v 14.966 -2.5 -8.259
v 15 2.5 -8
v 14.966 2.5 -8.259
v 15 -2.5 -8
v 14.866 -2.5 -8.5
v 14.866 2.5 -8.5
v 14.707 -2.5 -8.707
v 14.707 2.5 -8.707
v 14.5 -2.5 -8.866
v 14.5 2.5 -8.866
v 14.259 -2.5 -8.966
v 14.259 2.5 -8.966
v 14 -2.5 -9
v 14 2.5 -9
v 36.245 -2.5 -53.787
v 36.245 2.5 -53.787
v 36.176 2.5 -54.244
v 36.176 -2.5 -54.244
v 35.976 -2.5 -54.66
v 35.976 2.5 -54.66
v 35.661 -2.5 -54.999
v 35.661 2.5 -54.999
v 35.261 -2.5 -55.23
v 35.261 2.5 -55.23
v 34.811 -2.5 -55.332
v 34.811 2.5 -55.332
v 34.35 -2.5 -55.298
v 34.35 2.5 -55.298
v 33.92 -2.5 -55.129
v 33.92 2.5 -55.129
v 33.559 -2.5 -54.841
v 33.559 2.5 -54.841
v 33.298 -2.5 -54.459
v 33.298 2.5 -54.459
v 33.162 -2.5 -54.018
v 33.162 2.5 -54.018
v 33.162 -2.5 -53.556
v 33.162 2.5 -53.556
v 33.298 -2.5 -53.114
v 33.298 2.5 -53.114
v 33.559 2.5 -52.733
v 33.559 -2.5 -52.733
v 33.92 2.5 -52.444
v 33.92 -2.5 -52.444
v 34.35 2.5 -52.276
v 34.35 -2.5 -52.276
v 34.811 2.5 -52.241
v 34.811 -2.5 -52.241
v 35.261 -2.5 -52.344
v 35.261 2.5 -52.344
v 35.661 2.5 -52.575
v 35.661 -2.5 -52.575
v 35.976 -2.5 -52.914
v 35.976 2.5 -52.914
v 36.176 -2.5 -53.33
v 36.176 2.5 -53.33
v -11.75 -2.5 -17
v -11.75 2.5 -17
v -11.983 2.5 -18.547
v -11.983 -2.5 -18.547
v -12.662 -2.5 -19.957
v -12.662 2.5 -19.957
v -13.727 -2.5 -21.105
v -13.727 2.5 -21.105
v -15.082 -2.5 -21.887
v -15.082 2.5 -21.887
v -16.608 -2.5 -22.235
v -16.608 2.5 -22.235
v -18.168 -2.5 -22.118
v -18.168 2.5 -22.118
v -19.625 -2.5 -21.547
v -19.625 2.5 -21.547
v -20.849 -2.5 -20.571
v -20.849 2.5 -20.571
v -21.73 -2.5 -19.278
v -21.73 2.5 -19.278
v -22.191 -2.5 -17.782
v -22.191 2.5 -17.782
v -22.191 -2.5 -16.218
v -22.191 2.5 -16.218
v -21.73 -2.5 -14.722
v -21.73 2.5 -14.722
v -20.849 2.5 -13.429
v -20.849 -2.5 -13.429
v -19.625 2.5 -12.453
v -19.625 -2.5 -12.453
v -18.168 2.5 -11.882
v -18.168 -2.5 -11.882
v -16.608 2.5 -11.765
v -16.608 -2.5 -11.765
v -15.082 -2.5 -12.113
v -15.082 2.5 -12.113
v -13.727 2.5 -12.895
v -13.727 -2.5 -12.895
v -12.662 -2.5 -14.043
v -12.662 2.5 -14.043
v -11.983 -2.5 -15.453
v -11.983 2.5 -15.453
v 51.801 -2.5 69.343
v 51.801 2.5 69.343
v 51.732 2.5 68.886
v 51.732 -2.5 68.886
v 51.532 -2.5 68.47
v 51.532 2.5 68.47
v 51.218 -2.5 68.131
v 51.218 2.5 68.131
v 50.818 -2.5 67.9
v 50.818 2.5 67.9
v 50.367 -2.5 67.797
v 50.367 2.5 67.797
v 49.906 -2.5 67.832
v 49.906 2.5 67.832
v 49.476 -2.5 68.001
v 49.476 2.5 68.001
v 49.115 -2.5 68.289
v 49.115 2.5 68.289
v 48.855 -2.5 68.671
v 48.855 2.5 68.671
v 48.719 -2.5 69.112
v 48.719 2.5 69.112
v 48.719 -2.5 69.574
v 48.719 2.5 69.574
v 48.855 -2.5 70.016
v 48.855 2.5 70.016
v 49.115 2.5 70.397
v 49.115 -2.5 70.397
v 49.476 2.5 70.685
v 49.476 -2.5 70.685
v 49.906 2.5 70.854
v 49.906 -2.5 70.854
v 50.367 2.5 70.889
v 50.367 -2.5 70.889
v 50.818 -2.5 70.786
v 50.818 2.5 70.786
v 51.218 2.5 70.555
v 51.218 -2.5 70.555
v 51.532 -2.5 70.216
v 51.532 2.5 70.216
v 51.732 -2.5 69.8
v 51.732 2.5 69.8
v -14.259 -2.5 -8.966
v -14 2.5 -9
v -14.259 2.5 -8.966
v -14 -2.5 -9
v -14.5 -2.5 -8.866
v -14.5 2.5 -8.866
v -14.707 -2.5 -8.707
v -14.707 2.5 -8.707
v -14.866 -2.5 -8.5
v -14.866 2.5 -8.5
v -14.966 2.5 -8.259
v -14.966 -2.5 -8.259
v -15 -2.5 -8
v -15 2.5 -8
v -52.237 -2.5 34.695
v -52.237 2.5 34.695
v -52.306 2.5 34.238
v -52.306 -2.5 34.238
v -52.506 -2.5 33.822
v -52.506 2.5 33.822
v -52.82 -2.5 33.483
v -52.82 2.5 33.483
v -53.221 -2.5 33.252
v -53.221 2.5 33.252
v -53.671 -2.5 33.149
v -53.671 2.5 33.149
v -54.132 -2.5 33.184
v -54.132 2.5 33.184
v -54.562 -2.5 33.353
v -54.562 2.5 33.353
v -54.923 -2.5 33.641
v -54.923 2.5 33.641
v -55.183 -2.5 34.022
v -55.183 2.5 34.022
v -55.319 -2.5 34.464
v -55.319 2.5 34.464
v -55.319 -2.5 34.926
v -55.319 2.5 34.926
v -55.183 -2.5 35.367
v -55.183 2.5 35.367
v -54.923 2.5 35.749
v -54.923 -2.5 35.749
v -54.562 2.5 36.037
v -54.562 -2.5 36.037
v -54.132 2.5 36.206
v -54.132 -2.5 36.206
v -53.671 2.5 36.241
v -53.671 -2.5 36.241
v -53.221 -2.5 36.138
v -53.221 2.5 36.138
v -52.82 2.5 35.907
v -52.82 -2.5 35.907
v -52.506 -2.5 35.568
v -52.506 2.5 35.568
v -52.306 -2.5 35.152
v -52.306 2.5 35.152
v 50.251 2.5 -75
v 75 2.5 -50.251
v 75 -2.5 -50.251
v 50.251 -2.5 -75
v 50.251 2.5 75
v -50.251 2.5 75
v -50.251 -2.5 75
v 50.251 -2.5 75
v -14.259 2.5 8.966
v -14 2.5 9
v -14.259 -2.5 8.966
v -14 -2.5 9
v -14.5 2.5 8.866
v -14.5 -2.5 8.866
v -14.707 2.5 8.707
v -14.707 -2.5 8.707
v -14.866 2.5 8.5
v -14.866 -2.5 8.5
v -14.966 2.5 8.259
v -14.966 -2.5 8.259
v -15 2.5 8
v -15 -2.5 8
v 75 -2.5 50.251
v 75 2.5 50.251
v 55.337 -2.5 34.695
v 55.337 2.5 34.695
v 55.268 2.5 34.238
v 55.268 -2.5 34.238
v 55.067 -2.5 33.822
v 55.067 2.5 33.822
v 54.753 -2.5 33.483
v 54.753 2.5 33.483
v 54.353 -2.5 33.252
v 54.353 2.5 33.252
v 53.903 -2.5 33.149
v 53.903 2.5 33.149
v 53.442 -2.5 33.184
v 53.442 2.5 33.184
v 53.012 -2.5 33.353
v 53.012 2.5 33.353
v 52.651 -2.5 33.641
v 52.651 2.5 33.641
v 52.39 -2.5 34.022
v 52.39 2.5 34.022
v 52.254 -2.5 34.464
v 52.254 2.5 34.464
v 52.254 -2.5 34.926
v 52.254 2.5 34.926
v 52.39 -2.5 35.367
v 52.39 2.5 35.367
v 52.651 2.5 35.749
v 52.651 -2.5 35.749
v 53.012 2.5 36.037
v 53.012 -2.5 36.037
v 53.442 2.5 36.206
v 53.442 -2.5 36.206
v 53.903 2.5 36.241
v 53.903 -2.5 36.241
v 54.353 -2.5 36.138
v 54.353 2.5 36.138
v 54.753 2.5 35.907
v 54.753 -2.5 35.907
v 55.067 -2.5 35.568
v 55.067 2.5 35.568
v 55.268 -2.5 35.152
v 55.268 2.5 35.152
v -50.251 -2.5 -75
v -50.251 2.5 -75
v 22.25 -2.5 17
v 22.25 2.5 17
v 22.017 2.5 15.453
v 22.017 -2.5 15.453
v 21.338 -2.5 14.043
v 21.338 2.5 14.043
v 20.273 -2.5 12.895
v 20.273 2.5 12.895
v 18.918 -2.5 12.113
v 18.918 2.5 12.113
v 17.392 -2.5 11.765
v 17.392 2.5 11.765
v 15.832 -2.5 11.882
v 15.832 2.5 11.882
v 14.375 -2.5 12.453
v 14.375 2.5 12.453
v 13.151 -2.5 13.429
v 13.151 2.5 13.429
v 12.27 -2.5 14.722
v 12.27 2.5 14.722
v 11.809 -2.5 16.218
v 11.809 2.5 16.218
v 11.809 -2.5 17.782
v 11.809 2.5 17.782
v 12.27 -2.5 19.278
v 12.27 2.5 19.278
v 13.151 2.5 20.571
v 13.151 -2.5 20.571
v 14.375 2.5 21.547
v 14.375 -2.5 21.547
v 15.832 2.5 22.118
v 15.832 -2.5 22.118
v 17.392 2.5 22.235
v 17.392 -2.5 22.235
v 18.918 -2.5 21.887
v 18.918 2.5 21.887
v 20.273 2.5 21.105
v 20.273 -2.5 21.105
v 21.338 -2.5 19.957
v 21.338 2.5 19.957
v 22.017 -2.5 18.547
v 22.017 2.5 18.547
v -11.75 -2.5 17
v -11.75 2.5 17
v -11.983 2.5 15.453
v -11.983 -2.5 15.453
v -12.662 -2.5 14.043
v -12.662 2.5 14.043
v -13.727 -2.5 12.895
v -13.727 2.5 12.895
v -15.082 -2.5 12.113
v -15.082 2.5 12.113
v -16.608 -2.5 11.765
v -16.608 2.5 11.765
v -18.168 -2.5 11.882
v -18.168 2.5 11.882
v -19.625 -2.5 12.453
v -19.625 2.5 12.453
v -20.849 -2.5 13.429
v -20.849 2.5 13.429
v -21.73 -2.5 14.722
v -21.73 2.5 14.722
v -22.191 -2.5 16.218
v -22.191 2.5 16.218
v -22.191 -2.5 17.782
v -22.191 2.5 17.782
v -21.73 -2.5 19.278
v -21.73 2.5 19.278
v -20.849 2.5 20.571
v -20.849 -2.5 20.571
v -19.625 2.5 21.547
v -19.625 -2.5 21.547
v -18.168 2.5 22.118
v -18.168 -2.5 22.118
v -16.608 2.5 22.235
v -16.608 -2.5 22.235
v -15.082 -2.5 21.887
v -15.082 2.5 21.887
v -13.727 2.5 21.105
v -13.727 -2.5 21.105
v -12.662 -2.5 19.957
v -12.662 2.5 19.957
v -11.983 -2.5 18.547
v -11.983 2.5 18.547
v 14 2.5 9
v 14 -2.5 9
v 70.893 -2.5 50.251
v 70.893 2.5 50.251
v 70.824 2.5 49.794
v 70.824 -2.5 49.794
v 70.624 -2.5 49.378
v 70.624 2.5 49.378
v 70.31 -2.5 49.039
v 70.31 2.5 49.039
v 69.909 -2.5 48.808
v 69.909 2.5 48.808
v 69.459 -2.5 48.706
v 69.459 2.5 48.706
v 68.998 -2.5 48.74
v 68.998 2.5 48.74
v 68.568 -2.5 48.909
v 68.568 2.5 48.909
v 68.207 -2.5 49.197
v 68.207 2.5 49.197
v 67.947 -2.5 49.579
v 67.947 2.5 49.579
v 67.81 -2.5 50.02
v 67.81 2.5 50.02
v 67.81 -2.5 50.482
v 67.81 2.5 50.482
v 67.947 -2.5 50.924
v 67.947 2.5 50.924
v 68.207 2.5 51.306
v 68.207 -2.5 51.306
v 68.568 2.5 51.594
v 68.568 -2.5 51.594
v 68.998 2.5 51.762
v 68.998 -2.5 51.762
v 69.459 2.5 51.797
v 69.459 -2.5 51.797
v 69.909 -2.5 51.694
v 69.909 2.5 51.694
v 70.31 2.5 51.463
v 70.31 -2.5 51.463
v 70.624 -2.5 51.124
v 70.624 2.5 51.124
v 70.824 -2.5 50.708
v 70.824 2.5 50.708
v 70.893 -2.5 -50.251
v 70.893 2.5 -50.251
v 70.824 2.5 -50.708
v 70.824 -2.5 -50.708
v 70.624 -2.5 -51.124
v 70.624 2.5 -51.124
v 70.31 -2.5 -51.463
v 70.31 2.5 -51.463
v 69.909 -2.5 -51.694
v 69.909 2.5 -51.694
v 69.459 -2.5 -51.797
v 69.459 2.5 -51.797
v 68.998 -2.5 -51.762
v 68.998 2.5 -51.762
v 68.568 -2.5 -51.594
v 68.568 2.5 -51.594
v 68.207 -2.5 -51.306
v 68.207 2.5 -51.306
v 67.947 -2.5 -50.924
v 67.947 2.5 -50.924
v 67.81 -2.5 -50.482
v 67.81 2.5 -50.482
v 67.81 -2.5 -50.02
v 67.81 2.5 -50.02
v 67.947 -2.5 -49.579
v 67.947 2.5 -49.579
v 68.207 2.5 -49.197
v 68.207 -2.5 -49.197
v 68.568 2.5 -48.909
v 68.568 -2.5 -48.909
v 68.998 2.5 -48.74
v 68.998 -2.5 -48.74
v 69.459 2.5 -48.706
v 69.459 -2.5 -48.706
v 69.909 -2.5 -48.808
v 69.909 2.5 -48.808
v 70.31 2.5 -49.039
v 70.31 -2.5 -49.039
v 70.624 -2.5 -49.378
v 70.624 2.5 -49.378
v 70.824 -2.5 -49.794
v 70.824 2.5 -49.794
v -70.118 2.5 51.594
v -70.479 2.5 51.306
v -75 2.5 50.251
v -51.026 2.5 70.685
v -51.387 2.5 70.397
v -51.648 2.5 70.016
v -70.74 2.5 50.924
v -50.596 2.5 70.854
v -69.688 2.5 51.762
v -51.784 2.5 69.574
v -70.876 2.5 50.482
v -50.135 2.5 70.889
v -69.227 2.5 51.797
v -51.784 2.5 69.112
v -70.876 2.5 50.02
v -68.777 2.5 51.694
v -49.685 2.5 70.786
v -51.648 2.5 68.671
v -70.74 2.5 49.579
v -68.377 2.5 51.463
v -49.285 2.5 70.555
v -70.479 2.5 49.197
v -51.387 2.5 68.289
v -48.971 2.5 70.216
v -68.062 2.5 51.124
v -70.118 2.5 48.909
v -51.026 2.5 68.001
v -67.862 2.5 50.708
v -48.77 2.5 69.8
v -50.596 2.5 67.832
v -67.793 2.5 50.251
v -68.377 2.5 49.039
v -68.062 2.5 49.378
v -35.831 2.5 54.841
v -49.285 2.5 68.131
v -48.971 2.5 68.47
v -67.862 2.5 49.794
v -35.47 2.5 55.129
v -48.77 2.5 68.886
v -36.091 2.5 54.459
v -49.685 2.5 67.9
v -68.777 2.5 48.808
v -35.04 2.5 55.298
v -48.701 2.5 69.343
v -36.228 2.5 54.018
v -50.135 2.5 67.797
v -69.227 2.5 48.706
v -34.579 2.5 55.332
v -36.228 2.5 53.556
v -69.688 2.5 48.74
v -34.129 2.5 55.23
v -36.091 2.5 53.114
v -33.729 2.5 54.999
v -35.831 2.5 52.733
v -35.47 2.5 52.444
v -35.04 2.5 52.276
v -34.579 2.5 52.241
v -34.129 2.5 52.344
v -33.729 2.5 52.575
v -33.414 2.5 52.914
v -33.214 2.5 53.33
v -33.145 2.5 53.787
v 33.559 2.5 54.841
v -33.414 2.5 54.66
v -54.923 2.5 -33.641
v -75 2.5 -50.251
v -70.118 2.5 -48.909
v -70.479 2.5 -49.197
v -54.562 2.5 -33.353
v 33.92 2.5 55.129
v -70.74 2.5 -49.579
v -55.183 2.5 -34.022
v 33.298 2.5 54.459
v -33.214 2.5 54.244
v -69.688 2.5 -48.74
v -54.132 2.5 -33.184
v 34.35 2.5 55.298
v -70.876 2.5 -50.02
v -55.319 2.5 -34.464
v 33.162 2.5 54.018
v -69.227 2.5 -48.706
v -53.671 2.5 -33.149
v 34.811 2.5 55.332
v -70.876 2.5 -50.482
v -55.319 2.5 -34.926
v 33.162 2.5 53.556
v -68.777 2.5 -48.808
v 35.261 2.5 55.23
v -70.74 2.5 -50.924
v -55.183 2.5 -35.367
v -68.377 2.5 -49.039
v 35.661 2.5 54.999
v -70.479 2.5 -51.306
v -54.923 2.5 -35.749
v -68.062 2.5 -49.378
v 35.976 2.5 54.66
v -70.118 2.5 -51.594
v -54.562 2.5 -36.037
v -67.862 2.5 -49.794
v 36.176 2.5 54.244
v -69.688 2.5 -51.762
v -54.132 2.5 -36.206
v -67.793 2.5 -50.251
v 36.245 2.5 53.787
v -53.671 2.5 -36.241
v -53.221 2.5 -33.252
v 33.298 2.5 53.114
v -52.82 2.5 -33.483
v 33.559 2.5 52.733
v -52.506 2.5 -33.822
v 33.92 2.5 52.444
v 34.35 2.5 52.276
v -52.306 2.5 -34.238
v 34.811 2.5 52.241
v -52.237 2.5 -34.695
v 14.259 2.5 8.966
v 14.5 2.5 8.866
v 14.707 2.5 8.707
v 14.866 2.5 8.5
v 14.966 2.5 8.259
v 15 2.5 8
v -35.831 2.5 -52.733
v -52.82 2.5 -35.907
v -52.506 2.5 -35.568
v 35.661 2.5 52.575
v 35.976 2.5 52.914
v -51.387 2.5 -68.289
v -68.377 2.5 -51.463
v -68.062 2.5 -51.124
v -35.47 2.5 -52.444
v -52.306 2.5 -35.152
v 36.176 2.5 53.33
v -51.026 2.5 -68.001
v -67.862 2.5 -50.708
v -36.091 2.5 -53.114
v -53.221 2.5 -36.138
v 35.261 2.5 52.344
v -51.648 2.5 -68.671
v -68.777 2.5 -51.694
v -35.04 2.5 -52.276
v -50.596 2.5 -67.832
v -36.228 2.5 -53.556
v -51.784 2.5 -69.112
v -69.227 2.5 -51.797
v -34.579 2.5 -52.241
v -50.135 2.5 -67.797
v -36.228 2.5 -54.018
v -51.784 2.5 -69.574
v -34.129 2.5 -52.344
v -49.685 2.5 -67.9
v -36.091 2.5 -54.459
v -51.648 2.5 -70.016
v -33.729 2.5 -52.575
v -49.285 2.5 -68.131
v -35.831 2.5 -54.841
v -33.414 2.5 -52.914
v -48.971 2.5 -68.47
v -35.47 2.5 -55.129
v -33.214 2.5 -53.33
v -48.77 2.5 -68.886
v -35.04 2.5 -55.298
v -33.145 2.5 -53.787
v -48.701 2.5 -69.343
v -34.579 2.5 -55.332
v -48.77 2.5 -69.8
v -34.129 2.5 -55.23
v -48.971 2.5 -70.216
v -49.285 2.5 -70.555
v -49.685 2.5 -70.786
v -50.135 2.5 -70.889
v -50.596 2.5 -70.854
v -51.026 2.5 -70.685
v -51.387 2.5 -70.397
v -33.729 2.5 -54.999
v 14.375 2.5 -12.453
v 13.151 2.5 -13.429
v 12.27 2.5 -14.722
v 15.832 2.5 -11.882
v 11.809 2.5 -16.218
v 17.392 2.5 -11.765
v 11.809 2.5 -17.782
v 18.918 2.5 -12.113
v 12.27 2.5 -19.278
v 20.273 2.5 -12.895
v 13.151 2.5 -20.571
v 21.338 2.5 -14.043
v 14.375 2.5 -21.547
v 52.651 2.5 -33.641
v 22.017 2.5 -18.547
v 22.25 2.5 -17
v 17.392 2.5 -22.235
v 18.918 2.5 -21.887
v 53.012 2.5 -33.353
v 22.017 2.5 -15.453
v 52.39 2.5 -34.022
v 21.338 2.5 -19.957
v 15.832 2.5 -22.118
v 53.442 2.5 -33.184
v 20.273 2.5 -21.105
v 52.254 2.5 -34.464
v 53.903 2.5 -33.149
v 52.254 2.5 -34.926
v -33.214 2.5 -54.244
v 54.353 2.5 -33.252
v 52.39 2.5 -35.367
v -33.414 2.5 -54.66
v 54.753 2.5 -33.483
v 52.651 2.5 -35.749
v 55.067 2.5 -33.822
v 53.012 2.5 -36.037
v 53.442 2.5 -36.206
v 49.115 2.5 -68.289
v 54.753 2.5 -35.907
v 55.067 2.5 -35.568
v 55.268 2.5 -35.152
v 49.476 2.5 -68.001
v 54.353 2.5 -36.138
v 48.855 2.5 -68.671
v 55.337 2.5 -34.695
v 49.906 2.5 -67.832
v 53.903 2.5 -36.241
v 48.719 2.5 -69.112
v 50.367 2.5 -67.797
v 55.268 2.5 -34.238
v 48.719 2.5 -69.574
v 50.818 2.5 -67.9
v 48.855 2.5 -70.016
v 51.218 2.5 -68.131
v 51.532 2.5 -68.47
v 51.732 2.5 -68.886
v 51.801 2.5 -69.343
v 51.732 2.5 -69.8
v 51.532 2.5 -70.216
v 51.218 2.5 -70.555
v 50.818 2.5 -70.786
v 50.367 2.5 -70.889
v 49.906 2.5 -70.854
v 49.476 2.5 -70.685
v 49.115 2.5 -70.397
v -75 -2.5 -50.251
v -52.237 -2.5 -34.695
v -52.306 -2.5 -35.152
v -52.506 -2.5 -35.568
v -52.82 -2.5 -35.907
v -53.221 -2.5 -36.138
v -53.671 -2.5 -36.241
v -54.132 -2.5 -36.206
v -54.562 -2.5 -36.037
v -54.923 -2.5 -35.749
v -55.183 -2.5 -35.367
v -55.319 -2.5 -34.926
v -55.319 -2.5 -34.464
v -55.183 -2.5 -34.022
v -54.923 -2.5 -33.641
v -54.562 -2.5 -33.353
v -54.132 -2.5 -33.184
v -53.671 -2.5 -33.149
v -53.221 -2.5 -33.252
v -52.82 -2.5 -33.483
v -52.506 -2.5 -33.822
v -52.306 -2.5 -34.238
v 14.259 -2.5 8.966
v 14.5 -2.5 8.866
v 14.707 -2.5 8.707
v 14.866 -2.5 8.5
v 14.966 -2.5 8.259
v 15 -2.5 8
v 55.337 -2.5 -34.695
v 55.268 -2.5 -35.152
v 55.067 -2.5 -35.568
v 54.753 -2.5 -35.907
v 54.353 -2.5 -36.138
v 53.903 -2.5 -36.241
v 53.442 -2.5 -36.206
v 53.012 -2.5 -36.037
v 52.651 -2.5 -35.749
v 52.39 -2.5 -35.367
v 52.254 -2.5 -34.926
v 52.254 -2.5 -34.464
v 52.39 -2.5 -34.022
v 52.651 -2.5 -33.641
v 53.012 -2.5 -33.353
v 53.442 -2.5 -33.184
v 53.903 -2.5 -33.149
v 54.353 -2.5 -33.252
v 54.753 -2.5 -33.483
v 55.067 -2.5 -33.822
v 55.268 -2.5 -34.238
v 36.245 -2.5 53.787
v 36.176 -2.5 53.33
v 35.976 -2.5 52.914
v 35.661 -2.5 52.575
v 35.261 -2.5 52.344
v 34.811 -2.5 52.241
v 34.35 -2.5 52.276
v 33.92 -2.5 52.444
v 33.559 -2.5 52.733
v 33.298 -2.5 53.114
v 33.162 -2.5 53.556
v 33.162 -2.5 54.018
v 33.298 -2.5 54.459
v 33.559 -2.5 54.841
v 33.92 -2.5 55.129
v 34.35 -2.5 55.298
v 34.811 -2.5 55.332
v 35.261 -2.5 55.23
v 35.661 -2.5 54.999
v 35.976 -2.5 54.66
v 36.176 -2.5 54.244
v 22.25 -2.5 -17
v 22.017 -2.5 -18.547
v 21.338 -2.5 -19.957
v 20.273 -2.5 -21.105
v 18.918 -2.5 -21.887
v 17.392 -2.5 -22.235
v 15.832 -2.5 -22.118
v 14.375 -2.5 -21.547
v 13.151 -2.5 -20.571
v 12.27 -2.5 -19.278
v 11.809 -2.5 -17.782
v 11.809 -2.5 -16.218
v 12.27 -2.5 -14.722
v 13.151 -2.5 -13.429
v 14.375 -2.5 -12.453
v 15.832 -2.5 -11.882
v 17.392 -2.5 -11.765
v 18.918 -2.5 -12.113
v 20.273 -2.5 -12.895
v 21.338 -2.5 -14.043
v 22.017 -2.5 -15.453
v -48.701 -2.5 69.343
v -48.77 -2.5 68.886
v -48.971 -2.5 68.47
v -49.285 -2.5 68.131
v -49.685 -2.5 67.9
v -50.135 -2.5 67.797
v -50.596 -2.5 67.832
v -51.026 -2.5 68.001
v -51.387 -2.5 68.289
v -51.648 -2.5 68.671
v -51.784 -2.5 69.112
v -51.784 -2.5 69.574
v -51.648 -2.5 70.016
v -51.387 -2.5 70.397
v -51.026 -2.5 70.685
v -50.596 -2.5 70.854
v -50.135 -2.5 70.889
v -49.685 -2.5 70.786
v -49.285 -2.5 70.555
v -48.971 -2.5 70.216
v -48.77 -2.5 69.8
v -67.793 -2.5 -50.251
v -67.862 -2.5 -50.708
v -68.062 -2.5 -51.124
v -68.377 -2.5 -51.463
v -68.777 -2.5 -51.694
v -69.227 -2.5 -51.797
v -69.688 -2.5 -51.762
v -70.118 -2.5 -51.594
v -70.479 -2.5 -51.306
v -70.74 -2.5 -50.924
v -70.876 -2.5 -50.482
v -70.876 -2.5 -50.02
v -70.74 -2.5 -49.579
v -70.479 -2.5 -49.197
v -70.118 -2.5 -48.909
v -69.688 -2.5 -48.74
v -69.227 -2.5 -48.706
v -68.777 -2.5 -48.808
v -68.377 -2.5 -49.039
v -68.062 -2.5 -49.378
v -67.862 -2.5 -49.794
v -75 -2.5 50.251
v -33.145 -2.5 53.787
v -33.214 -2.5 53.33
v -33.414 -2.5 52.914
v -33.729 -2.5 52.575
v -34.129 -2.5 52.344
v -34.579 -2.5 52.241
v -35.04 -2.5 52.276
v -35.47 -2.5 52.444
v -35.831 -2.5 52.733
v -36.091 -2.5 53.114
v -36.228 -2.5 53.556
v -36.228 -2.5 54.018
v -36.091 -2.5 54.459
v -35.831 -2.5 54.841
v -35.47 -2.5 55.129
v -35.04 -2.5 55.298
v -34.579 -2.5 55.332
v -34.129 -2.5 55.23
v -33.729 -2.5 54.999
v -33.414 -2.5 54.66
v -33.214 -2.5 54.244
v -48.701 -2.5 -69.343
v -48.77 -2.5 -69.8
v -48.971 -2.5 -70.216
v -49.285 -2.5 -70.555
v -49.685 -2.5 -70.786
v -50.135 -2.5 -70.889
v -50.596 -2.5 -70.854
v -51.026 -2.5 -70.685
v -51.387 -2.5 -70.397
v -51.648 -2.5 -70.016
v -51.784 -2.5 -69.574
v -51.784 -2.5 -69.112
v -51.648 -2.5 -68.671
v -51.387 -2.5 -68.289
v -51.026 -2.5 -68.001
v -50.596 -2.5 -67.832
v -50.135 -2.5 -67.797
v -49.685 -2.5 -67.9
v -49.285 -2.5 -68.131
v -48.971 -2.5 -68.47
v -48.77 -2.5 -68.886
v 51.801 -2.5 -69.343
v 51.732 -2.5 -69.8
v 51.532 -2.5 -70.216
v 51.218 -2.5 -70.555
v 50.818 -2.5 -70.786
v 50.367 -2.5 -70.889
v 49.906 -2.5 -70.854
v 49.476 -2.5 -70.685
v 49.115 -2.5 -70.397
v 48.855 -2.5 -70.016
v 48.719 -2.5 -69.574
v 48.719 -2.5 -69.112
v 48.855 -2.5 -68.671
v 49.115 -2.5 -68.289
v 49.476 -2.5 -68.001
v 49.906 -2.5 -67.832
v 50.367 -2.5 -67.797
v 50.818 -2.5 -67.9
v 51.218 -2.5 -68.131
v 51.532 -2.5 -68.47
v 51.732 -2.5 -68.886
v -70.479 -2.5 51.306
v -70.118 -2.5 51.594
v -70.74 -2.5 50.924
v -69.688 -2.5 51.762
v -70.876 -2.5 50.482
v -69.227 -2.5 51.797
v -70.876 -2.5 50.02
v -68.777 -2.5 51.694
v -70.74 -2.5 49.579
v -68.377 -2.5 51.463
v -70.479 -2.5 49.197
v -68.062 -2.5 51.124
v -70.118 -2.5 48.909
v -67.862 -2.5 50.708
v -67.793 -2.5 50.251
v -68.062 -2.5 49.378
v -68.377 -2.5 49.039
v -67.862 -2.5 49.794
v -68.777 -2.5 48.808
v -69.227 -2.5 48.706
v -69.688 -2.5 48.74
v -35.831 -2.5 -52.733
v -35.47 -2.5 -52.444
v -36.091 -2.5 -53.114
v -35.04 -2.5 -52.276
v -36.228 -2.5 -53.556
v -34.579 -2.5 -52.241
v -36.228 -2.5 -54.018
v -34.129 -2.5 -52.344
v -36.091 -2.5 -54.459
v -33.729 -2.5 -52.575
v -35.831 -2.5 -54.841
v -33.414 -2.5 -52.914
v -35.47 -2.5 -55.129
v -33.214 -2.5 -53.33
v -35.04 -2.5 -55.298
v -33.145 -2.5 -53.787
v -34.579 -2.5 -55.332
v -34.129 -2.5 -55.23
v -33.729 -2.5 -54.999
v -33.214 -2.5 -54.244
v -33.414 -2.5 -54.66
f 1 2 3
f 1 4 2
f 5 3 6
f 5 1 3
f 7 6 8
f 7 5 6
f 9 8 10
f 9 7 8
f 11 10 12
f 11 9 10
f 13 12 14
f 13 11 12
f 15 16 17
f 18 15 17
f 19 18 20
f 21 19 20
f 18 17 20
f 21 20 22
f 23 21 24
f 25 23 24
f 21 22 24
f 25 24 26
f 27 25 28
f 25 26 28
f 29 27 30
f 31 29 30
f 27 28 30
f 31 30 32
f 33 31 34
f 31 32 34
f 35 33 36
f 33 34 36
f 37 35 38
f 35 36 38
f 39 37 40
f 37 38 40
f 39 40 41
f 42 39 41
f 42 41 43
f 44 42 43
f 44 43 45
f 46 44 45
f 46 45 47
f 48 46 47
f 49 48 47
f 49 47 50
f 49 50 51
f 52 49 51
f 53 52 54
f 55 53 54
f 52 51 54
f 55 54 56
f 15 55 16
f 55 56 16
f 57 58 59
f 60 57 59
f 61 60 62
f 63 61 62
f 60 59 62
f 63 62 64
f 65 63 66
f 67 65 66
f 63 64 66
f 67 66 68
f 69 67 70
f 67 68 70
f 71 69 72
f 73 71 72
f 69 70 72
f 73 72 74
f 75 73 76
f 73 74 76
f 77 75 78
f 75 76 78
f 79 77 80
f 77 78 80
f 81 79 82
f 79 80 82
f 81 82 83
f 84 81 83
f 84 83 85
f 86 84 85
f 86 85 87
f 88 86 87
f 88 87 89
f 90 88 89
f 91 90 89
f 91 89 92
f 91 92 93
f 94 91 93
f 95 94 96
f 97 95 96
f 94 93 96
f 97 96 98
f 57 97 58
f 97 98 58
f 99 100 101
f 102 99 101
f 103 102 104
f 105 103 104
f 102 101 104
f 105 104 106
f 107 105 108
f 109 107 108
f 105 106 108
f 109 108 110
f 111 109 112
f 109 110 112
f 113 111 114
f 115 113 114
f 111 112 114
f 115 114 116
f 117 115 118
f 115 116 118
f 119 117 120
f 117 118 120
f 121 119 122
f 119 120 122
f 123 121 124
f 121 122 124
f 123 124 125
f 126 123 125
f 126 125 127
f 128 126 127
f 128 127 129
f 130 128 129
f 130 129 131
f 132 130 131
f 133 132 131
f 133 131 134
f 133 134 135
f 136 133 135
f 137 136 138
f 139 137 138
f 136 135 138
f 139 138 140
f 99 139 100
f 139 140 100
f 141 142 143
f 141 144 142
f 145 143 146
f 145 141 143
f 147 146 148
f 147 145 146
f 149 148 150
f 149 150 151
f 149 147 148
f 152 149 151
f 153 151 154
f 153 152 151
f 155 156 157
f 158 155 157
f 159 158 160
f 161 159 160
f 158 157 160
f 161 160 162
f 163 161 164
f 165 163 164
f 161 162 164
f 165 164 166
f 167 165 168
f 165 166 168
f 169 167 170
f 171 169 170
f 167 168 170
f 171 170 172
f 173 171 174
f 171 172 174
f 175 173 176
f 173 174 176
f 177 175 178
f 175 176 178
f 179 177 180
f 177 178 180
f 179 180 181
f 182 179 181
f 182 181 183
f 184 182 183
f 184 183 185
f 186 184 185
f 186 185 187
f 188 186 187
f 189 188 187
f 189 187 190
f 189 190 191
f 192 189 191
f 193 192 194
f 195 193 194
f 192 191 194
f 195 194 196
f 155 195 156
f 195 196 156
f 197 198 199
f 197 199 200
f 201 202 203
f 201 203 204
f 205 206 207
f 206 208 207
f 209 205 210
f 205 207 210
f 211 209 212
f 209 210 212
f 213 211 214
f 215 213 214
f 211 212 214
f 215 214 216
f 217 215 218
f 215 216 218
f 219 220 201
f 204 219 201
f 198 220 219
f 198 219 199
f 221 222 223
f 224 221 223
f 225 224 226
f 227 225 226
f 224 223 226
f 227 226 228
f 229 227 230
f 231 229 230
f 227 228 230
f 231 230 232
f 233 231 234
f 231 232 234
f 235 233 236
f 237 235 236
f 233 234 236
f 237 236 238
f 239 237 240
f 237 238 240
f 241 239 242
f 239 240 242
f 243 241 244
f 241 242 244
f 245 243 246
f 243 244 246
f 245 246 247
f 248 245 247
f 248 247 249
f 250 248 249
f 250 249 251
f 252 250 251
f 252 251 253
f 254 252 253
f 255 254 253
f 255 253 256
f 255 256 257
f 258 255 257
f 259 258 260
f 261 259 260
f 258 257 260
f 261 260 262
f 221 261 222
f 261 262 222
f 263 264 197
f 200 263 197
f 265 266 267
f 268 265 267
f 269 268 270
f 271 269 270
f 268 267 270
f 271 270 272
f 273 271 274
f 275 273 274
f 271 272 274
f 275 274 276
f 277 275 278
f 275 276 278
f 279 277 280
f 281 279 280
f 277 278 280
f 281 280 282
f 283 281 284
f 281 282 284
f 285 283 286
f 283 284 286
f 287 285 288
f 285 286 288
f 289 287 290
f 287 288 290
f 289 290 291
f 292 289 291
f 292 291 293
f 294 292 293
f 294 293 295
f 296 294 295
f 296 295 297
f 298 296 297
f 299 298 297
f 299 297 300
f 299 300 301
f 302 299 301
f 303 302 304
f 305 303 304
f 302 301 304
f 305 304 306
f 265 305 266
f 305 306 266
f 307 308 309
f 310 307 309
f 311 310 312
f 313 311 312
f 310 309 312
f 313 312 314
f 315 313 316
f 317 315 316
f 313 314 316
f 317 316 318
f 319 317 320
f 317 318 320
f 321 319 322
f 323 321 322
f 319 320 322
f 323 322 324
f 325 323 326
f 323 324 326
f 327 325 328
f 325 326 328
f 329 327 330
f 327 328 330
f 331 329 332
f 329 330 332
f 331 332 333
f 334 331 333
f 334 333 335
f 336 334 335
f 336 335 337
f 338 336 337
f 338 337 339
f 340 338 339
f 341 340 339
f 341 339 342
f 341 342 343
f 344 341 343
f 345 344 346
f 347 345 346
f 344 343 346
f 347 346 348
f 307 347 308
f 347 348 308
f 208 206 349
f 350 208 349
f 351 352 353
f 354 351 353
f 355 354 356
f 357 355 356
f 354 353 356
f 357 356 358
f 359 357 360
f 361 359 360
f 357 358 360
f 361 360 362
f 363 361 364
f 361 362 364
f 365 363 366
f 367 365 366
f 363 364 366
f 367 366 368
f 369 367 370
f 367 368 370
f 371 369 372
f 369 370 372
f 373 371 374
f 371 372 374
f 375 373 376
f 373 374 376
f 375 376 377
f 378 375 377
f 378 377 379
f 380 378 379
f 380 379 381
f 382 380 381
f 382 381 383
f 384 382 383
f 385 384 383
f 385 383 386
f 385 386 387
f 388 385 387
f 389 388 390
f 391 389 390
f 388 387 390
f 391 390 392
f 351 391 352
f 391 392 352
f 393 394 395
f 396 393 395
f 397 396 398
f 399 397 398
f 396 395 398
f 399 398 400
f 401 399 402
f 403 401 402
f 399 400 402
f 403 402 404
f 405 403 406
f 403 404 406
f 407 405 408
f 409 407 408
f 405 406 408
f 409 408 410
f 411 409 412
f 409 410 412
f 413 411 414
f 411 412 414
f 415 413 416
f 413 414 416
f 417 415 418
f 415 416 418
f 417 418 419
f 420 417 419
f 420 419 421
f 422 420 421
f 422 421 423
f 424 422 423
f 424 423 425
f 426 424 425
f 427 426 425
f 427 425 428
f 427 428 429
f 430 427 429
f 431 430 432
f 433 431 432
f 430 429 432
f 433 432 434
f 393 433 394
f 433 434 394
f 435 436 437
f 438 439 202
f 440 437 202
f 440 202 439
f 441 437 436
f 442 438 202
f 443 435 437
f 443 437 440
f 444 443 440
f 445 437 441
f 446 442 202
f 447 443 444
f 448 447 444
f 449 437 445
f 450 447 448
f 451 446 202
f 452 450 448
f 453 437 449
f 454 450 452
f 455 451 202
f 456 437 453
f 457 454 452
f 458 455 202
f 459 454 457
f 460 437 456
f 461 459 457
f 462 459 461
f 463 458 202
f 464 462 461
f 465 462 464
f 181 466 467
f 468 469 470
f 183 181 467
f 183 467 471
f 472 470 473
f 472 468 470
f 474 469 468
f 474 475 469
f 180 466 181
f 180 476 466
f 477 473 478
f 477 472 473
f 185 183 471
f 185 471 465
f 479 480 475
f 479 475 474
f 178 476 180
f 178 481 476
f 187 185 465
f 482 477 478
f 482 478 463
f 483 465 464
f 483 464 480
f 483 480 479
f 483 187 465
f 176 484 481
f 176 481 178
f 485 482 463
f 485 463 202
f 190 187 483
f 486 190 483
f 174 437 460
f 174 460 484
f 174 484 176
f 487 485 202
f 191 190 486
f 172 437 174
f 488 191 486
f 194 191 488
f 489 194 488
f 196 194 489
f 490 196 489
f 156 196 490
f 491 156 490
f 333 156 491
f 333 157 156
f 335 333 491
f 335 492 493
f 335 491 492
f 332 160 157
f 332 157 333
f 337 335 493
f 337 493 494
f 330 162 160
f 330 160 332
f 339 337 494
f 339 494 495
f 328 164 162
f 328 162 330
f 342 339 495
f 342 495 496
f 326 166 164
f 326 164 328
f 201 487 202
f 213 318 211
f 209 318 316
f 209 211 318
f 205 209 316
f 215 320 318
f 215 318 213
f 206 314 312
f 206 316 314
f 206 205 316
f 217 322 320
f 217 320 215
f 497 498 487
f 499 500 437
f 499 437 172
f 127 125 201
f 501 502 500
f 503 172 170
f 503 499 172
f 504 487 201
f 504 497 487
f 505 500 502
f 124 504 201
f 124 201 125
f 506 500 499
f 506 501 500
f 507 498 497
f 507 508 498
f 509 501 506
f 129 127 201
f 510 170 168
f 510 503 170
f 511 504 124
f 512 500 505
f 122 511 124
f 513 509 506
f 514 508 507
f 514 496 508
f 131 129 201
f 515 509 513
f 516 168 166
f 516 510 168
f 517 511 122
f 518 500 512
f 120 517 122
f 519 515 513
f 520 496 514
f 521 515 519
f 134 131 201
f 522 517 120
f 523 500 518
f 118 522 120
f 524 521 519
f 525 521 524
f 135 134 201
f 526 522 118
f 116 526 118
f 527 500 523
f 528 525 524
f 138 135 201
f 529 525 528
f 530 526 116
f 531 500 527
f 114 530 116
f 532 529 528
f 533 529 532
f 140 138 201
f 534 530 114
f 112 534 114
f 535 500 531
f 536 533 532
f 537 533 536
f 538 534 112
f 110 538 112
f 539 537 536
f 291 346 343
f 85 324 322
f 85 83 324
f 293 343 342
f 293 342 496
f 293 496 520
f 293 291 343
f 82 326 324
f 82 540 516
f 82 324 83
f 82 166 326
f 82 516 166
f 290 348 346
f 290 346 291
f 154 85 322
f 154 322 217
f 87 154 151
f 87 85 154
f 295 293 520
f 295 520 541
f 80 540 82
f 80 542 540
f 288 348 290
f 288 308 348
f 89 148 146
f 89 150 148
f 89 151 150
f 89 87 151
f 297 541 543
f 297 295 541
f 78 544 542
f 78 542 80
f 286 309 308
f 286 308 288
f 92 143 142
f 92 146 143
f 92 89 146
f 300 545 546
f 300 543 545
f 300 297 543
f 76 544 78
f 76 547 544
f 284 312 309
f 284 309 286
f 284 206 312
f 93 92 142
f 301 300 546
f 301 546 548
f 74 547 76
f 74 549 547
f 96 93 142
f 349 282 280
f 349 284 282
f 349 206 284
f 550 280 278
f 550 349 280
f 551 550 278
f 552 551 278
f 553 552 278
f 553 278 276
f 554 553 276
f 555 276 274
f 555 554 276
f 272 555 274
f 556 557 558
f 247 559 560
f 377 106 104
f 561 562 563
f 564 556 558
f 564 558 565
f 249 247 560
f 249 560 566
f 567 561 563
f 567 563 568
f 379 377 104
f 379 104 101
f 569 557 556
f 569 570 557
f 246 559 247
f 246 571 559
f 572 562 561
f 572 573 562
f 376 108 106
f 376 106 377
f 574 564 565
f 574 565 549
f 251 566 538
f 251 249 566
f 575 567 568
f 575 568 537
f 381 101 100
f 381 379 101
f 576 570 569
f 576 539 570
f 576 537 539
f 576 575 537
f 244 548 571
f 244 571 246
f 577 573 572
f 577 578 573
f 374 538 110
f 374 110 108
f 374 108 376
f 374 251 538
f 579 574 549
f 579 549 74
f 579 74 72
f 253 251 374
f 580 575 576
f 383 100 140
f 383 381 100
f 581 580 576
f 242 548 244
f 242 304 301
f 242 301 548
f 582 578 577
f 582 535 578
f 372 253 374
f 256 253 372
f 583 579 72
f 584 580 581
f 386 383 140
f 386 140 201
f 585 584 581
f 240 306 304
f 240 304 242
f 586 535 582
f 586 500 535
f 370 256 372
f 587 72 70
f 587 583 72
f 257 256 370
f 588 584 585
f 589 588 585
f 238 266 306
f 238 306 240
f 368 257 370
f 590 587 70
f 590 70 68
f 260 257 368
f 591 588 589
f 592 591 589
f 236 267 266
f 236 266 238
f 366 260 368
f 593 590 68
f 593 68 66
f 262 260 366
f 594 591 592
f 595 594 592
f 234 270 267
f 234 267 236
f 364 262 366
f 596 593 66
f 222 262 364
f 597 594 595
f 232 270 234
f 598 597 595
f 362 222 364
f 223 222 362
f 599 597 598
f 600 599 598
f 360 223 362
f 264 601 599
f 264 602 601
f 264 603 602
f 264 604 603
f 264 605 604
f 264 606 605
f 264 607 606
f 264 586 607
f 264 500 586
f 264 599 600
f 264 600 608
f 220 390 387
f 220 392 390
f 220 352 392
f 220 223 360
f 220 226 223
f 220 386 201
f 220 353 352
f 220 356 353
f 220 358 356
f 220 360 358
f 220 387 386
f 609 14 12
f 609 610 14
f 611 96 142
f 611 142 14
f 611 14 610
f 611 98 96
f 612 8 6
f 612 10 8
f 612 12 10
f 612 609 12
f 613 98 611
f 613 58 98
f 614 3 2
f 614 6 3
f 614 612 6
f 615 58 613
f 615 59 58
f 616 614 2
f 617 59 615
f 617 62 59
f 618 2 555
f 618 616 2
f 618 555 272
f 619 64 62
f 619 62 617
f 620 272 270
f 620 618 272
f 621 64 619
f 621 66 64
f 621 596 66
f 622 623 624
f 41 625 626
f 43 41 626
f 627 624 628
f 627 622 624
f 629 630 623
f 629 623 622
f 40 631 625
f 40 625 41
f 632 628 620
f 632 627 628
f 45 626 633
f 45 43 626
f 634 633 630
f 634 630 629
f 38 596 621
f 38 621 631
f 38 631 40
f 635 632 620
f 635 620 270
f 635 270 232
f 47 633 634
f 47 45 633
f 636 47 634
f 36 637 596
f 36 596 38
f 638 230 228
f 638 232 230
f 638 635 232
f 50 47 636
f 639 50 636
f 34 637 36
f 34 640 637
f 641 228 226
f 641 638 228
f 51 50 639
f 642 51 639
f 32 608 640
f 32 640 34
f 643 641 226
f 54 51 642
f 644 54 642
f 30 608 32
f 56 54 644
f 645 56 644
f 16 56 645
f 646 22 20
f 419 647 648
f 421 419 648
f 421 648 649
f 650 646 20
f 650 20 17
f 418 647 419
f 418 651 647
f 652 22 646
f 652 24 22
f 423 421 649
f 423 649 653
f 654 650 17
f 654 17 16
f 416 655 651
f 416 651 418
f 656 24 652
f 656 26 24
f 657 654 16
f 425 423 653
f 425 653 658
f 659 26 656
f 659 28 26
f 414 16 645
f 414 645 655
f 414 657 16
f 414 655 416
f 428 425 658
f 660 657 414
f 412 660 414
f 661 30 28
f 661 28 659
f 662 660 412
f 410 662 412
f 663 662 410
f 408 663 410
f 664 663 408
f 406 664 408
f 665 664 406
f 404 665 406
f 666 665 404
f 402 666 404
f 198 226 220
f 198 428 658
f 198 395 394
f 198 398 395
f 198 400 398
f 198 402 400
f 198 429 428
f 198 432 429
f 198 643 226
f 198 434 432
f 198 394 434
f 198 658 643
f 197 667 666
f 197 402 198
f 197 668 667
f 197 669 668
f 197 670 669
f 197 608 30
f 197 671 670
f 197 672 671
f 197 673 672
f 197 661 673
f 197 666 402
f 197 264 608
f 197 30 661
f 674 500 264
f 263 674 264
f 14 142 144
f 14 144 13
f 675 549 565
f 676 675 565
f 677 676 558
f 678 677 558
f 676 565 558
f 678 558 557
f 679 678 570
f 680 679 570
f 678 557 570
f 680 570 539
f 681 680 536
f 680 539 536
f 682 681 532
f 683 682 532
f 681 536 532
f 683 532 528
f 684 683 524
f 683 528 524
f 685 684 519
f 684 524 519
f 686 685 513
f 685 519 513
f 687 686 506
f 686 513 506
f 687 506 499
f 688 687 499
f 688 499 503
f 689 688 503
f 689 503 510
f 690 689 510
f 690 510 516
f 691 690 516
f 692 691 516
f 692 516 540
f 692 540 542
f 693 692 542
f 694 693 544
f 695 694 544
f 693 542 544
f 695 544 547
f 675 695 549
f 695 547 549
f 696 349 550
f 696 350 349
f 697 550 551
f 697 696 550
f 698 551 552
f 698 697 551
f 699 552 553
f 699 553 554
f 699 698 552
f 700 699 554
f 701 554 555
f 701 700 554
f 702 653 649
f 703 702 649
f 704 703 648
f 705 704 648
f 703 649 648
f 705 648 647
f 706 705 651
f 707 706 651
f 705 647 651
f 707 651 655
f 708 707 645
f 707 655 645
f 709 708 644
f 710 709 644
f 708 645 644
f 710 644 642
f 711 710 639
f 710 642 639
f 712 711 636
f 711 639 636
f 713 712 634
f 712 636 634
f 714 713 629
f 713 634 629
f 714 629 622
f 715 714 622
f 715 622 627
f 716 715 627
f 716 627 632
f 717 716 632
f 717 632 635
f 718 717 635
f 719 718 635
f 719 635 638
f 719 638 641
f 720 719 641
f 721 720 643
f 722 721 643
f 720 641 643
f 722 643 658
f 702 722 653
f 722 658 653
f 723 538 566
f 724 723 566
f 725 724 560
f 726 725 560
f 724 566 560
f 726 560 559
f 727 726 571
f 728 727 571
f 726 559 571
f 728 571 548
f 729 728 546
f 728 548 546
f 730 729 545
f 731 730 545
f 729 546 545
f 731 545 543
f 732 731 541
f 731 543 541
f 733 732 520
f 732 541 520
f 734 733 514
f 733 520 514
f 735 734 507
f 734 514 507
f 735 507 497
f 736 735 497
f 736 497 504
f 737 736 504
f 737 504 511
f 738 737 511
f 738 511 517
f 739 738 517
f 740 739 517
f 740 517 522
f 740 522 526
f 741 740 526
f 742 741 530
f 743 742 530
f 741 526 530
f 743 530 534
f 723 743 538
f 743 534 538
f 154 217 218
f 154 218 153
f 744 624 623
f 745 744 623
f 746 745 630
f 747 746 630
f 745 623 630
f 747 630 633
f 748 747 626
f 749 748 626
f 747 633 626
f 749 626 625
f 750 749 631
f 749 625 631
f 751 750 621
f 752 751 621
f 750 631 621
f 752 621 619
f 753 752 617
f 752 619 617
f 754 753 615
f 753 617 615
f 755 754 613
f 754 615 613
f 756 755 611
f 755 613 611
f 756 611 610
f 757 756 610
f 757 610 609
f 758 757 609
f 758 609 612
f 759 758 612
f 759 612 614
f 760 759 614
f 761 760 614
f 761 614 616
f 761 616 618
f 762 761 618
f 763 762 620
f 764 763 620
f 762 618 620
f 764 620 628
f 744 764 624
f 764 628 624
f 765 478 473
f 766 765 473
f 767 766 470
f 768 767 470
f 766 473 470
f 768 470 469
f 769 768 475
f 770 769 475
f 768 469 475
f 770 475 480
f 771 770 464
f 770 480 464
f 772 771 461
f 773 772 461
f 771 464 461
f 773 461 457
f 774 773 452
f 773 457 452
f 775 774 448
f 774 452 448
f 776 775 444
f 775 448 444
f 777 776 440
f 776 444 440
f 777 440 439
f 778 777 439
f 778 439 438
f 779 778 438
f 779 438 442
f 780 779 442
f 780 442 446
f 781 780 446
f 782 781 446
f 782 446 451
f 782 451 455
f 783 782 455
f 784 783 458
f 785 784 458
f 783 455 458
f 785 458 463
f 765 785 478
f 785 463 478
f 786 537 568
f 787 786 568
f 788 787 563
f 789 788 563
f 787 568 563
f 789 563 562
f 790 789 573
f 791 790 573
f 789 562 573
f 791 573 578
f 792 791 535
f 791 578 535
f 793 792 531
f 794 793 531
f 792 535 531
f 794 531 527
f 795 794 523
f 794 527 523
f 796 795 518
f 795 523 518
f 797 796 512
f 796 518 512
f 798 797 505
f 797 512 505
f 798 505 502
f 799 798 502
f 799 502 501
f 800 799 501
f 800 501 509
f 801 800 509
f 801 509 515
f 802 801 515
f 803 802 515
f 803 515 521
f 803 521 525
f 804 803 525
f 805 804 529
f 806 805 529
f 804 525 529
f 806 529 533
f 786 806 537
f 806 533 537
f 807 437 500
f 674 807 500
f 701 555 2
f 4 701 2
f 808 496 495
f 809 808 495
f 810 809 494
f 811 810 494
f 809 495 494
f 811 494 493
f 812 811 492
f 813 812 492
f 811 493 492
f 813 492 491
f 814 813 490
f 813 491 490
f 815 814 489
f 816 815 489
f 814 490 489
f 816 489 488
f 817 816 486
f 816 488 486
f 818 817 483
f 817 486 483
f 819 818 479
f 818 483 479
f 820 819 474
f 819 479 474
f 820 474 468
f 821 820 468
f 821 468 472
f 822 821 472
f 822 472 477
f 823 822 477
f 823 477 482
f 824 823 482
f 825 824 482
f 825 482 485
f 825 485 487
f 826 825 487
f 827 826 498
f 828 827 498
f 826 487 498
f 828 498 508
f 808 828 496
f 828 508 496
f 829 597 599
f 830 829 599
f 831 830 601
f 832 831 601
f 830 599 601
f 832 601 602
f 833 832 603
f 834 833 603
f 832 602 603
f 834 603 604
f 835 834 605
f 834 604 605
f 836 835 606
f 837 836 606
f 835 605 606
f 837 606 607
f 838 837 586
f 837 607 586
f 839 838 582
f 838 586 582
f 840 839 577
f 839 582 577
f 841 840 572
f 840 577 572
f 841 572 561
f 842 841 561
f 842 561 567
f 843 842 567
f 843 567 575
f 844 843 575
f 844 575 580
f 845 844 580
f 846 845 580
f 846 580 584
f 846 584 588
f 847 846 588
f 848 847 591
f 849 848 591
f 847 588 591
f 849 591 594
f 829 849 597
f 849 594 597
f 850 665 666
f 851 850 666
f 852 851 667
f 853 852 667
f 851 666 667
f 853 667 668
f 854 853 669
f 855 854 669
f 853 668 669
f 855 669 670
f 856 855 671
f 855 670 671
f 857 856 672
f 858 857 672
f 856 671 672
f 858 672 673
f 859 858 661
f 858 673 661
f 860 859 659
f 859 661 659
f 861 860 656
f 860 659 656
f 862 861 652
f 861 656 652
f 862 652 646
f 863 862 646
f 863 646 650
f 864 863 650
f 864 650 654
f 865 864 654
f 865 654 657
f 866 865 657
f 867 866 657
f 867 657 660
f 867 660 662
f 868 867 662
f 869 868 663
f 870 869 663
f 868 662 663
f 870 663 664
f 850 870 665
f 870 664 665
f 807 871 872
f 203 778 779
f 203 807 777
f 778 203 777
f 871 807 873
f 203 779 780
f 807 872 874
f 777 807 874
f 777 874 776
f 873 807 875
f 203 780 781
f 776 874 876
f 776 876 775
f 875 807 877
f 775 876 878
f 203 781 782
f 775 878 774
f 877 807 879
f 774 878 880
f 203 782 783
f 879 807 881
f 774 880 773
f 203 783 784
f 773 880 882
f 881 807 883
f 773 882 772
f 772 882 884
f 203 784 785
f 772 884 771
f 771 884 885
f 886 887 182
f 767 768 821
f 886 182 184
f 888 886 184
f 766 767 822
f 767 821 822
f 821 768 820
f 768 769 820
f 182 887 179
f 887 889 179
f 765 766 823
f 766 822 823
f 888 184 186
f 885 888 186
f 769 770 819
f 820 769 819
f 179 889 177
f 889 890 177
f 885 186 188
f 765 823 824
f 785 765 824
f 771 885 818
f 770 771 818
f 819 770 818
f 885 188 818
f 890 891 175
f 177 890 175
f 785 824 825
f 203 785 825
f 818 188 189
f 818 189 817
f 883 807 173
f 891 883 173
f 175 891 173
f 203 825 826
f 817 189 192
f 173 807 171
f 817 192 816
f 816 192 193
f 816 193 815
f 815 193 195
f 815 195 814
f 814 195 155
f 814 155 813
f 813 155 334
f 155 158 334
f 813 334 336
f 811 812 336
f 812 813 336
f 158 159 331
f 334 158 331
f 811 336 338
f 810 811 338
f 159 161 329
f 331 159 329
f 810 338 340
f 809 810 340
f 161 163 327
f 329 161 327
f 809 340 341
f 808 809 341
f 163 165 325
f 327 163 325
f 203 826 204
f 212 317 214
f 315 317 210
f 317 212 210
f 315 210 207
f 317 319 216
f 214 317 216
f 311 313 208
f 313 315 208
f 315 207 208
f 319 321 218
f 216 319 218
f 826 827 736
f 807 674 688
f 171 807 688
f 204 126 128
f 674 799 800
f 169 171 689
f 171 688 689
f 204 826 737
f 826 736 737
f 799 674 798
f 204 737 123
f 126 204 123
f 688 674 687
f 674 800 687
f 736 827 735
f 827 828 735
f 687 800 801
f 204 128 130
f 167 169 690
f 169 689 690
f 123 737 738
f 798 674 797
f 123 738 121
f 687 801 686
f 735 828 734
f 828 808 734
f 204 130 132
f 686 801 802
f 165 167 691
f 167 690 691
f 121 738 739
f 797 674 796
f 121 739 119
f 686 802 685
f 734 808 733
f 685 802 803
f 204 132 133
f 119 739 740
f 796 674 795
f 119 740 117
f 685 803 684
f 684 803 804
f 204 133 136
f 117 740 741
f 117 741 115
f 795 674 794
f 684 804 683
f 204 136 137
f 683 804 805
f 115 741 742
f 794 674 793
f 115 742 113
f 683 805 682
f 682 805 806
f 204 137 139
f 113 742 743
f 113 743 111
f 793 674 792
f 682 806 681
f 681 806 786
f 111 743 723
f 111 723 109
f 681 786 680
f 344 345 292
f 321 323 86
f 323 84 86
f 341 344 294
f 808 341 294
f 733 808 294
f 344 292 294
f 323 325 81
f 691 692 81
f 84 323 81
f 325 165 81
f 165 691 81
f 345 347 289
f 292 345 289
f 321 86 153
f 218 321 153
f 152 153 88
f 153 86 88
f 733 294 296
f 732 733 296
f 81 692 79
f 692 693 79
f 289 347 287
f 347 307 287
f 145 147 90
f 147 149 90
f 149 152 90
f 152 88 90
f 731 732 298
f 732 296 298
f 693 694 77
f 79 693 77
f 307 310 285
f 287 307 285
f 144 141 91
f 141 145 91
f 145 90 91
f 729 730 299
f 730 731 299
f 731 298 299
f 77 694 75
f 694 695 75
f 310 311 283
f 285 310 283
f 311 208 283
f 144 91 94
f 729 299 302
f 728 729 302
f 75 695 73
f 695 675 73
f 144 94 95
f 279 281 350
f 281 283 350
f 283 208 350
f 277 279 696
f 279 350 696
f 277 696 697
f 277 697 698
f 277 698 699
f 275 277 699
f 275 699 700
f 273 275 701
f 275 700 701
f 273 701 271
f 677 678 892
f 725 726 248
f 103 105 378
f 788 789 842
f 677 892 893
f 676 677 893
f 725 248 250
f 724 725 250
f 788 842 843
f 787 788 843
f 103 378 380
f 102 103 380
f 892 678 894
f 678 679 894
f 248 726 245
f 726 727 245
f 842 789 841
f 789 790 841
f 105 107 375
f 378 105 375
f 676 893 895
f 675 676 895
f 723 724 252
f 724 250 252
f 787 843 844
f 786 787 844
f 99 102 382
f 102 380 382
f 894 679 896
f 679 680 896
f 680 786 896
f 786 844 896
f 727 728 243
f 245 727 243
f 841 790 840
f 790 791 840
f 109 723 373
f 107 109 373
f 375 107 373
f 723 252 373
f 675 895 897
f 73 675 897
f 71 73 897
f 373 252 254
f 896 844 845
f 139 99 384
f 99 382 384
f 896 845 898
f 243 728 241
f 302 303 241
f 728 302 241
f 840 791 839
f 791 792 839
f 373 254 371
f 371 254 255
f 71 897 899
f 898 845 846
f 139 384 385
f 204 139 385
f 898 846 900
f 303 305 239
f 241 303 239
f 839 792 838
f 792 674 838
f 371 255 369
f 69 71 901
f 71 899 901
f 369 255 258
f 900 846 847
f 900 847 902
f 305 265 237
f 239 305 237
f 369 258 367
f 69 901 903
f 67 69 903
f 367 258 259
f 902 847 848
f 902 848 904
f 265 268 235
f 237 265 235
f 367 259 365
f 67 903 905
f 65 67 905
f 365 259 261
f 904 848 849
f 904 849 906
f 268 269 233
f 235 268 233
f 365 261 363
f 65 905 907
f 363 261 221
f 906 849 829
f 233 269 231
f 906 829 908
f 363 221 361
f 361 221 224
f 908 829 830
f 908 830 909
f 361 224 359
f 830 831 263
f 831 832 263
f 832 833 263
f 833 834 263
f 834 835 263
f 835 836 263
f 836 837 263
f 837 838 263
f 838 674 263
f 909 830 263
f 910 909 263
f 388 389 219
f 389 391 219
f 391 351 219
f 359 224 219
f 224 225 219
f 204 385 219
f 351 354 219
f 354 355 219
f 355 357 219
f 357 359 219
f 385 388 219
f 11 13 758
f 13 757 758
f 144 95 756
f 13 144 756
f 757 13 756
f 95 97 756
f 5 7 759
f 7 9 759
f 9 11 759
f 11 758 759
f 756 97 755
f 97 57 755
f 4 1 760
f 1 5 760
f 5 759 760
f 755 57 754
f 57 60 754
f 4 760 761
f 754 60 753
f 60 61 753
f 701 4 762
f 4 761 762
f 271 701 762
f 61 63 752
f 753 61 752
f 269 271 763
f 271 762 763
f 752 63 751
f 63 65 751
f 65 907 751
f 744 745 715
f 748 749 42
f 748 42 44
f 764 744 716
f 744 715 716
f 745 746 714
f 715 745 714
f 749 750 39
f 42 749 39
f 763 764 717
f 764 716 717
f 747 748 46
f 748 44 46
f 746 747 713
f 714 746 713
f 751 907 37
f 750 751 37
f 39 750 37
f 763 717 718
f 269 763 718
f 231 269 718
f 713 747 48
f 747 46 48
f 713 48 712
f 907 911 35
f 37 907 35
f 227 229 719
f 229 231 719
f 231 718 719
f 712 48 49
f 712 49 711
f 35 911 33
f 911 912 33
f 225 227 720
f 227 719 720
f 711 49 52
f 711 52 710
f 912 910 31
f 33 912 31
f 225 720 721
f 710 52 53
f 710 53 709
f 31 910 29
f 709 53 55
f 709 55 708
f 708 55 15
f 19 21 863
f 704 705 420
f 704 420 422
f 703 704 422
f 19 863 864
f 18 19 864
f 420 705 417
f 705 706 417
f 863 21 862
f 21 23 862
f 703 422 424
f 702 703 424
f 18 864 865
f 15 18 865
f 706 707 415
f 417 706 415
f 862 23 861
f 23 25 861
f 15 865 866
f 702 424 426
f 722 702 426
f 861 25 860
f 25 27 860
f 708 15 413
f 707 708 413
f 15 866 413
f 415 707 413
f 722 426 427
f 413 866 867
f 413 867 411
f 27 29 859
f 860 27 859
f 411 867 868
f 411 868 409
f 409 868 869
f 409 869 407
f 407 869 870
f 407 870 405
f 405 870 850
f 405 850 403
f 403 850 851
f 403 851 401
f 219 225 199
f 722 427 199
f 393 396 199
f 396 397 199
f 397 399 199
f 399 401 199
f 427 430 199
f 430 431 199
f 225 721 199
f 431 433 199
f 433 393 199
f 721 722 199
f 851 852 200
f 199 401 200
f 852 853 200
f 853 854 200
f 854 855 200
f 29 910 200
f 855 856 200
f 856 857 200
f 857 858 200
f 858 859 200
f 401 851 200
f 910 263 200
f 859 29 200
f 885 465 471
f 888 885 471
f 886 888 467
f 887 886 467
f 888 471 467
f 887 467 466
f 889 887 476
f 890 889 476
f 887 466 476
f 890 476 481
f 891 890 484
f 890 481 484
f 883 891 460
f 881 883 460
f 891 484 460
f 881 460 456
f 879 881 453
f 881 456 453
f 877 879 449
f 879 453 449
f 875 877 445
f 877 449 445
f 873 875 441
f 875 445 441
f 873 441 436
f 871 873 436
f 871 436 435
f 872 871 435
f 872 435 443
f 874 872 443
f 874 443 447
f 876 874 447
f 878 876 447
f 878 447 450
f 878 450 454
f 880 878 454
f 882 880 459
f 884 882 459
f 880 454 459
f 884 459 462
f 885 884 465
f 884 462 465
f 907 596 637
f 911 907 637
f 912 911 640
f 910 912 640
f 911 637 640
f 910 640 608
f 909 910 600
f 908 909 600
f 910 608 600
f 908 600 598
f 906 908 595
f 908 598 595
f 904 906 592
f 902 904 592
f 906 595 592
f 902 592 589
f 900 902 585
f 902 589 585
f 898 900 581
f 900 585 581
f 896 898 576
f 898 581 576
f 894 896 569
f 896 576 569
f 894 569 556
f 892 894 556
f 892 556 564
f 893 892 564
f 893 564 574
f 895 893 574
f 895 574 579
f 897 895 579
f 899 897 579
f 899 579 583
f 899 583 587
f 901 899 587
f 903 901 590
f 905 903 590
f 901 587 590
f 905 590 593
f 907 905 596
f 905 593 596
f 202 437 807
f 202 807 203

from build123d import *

# Parameters (mm, degrees)
SKETCH1_W           = 150
SKETCH1_H           = 150
BOSS_EXTRUDE1_DEPTH = 2.5
CUT_EXTRUDE1_DEPTH  = 5
SKETCH3_R           = 1.55
CUT_EXTRUDE2_DEPTH  = 5
SKETCH4_R           = 5.25
SKETCH4_W           = 30
SKETCH4_H           = 18
CUT_EXTRUDE3_DEPTH  = 5
FILLET1_R           = 1


with BuildPart() as part:
    # Sketch1 → Boss-Extrude1 (new body, symmetric)
    with BuildSketch(Plane(origin=(0, 0, 0), x_dir=(1, 0, 0), z_dir=(0, 1, 0))):
        Rectangle(SKETCH1_W, SKETCH1_H)
    extrude(amount=BOSS_EXTRUDE1_DEPTH, both=True)

    # Sketch2 → Cut-Extrude1 (cut)
    with BuildSketch(Plane(origin=(0, 2.5, 0), x_dir=(1, 0, 0), z_dir=(0, 1, 0))):
        Polygon((50.251262658, 75), (75, 75), (75, 50.251262658), align=None)
        Polygon((-75, 75), (-75, 50.251262658), (-50.251262658, 75), align=None)
        Polygon((-50.251262658, -75), (-75, -75), (-75, -50.251262658), align=None)
        Polygon((75, -75), (75, -50.251262658), (50.251262658, -75), align=None)
    extrude(amount=-CUT_EXTRUDE1_DEPTH, mode=Mode.SUBTRACT)

    # Sketch3 → Cut-Extrude2 (cut)
    with BuildSketch(Plane(origin=(0, 2.5, 0), x_dir=(1, 0, 0), z_dir=(0, 1, 0))):
        with Locations((69.343145751, 50.251262658)):
            Circle(SKETCH3_R)
        with Locations((53.786796564, 34.694913472)):
            Circle(SKETCH3_R)
        with Locations((34.694913472, 53.786796564)):
            Circle(SKETCH3_R)
        with Locations((50.251262658, 69.343145751)):
            Circle(SKETCH3_R)
        with Locations((-69.343145751, 50.251262658)):
            Circle(SKETCH3_R)
        with Locations((-53.786796564, 34.694913472)):
            Circle(SKETCH3_R)
        with Locations((-34.694913472, 53.786796564)):
            Circle(SKETCH3_R)
        with Locations((-50.251262658, 69.343145751)):
            Circle(SKETCH3_R)
        with Locations((-53.786796564, -34.694913472)):
            Circle(SKETCH3_R)
        with Locations((-69.343145751, -50.251262658)):
            Circle(SKETCH3_R)
        with Locations((-34.694913472, -53.786796564)):
            Circle(SKETCH3_R)
        with Locations((-50.251262658, -69.343145751)):
            Circle(SKETCH3_R)
        with Locations((69.343145751, -50.251262658)):
            Circle(SKETCH3_R)
        with Locations((53.786796564, -34.694913472)):
            Circle(SKETCH3_R)
        with Locations((34.694913472, -53.786796564)):
            Circle(SKETCH3_R)
        with Locations((50.251262658, -69.343145751)):
            Circle(SKETCH3_R)
    extrude(amount=-CUT_EXTRUDE2_DEPTH, mode=Mode.SUBTRACT)

    # Sketch4 → Cut-Extrude3 (cut)
    with BuildSketch(Plane(origin=(0, 2.5, 0), x_dir=(1, 0, 0), z_dir=(0, 1, 0))):
        with Locations((17, -17)):
            Circle(SKETCH4_R)
        with Locations((17, 17)):
            Circle(SKETCH4_R)
        with Locations((-17, -17)):
            Circle(SKETCH4_R)
        with Locations((-17, 17)):
            Circle(SKETCH4_R)
        Rectangle(SKETCH4_W, SKETCH4_H)
    extrude(amount=-CUT_EXTRUDE3_DEPTH, mode=Mode.SUBTRACT)

    # Fillet1
    fillet1_edges = [part.edges().sort_by_distance(p)[0] for p in [
        (-15, 0, 9),
        (-15, 0, -9),
        (15, 0, -9),
        (15, 0, 9),
    ]]
    fillet(fillet1_edges, radius=FILLET1_R)


solid = part.part
